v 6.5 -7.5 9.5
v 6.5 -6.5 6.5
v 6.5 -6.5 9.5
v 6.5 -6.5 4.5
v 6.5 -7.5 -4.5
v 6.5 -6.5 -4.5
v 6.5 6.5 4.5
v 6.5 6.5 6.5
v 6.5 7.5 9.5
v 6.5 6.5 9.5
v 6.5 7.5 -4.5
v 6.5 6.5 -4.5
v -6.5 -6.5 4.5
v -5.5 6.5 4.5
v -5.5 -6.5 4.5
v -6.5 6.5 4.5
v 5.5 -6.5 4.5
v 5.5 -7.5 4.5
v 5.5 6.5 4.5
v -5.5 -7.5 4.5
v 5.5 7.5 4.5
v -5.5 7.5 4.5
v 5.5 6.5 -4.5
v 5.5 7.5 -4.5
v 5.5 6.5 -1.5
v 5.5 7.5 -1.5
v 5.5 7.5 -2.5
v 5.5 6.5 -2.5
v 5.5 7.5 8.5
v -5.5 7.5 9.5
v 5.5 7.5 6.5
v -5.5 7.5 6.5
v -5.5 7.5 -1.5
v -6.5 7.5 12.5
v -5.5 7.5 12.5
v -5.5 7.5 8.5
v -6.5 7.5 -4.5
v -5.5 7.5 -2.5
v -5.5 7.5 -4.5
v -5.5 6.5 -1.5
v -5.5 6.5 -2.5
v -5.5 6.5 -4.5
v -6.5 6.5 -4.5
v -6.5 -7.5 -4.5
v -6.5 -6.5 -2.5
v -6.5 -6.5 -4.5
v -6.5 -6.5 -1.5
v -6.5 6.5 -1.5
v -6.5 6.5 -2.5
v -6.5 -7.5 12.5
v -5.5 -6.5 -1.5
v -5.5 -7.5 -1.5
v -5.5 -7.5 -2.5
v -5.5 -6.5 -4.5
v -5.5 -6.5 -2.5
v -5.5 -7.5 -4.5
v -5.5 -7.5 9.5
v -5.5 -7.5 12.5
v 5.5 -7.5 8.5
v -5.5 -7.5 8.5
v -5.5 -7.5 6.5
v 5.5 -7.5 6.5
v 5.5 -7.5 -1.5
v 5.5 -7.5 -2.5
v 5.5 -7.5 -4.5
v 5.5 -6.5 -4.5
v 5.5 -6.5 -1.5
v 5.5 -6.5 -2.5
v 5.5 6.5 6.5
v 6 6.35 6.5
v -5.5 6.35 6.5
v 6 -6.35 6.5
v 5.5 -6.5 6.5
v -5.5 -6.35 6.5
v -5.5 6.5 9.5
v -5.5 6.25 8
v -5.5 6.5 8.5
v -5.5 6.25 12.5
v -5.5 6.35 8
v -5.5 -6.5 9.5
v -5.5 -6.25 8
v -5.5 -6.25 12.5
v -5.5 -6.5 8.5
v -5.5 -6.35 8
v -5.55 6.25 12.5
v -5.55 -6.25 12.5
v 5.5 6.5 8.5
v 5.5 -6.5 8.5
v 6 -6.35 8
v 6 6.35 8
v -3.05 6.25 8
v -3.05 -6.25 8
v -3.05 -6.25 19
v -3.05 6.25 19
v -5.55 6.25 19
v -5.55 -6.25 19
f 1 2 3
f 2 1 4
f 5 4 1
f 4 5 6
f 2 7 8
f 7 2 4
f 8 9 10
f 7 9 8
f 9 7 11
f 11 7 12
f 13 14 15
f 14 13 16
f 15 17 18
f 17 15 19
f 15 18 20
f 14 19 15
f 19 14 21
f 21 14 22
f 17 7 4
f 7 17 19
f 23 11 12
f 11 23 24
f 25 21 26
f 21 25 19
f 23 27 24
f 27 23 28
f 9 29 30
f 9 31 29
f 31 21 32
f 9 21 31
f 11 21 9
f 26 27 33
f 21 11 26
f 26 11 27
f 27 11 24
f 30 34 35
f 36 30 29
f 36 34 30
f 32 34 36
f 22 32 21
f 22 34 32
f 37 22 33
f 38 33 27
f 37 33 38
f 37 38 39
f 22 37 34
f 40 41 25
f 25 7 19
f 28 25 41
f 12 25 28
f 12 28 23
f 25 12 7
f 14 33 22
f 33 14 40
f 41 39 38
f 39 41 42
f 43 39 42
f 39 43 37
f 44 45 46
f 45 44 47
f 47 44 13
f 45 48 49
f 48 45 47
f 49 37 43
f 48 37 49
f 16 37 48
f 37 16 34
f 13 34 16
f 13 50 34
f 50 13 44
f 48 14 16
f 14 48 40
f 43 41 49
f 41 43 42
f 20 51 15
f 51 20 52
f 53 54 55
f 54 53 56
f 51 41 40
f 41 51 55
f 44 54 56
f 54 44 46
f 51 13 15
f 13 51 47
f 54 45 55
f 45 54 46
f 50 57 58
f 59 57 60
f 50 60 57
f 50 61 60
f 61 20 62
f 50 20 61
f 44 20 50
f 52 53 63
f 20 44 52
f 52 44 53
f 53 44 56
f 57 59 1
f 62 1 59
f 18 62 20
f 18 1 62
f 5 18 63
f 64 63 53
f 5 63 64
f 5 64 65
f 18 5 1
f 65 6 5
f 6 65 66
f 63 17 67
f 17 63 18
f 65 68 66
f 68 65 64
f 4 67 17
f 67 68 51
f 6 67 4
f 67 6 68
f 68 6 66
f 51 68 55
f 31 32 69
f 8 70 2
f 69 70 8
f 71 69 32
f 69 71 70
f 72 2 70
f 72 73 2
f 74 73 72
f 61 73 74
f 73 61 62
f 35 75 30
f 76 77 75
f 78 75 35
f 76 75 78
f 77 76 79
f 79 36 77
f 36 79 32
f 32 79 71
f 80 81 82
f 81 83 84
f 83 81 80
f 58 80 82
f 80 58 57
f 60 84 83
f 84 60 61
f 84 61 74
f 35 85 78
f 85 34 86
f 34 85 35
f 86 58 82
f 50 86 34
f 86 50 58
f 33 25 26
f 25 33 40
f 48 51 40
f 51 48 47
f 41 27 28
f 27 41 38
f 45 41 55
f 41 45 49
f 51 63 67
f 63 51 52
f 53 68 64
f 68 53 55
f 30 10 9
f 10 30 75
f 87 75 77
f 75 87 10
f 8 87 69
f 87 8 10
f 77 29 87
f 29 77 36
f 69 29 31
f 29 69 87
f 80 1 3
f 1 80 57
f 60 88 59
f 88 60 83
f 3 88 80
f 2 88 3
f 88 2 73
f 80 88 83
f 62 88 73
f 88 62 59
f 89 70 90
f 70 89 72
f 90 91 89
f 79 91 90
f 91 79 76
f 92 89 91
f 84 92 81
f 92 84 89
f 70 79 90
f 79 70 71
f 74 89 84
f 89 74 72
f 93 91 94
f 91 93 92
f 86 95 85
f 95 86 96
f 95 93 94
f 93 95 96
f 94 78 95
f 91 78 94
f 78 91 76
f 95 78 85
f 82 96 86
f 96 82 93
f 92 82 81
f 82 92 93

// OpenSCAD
module Chair_02(){
    // INPUT DATA

    Table_Leg = [1,1,9];      // lenght, width and height of legs
    Table_Top_Height = 2;     //  Height of theSeat

    Leg_Distance_x = 12;        
    Leg_Distance_y = 14;     

    seat_height = 6;         // Backpost size 
    seat_width = 1;           // Backpost width (x axis)


    // OUTPUT DATA

    translate([Leg_Distance_x*0.5,Leg_Distance_y*0.5,0])
    color("#82490b")
    cube([Table_Leg[0],Table_Leg[1],Table_Leg[2]],center=true);

    translate([-Leg_Distance_x*0.5,Leg_Distance_y*0.5,0])
    color("#82490b")
    cube([Table_Leg[0],Table_Leg[1],Table_Leg[2]],center=true);

    translate([-Leg_Distance_x*0.5,-Leg_Distance_y*0.5,0])
    color("#82490b")
    cube([Table_Leg[0],Table_Leg[1],Table_Leg[2]],center=true);

    translate([Leg_Distance_x*0.5,-Leg_Distance_y*0.5,0])
    color("#82490b")
    cube([Table_Leg[0],Table_Leg[1],Table_Leg[2]],center=true);

    Table_Upper = [Leg_Distance_x + Table_Leg[0],Leg_Distance_y +Table_Leg[1],Table_Top_Height];

    seat = [seat_width,Leg_Distance_y+Table_Leg[1],seat_height];

    translate([0,0,Table_Leg[2]*0.5+Table_Top_Height*0.5])
    color("#82490b")
    cube([Table_Upper[0],Table_Upper[1],Table_Upper[2]],center=true);

    translate([-Table_Upper[0]*0.5+seat[0]*0.5,0,Table_Leg[2]*0.5+Table_Top_Height+seat_height*0.5])
    color("#82490b")
    cube([seat[0],seat[1],seat[2]],center=true);

    rotate([0,0,90])
    translate([7,0,-2])
    color("#82490b")
    cube([1,12,1],center=true);


    rotate([0,0,90])
    translate([-7,0,-2])
    color("#82490b")
    cube([1,12,1],center=true);


    rotate([0,0,0])
    translate([-6,0,-2])
    color("#82490b")
    cube([1,14,1],center=true);

    rotate([0,0,90])
    translate([7,0,9])
    color("#82490b")
    cube([1,12,1],center=true);

    rotate([90,0,0])
    translate([6,7.5,-7])
    color("#82490b")
    cube([1,4,1],center=true);

    rotate([0,0,90])
    translate([-7,0,9])
    color("#82490b")
    cube([1,12,1],center=true);

    rotate([90,0,0])
    translate([6,7.5,7])
    color("#82490b")
    cube([1,4,1],center=true);


    translate([0,0,7])
    color("#F4FFFF")
    cube([12,12.7,2],center=true);

    translate([-4.3,0,13])
    rotate([0,90,0])
    color("#F4FFFF")
    cube([12,12.5,2.5],center=true);

}

Chair_02();

// Written by Nicolì Angelo (Gengio) 2024: 
// MIT License

//Permission is hereby granted, free of charge, to any person obtaining a copy of this software and associated documentation files (the "Software"), to deal in the Software without restriction, including without limitation the rights to use, copy, modify, merge, publish, distribute, sublicense, and/or sell copies of the Software, and to permit persons to whom the Software is furnished to do so, subject to the following conditions:

//The above copyright notice and this permission notice shall be included in all copies or substantial portions of the Software.

//THE SOFTWARE IS PROVIDED "AS IS", WITHOUT WARRANTY OF ANY KIND, EXPRESS OR IMPLIED, INCLUDING BUT NOT LIMITED TO THE WARRANTIES OF MERCHANTABILITY, FITNESS FOR A PARTICULAR PURPOSE AND NONINFRINGEMENT. IN NO EVENT SHALL THE AUTHORS OR COPYRIGHT HOLDERS BE LIABLE FOR ANY CLAIM, DAMAGES OR OTHER LIABILITY, WHETHER IN AN ACTION OF CONTRACT, TORT OR OTHERWISE, ARISING FROM, OUT OF OR IN CONNECTION WITH THE SOFTWARE OR THE USE OR OTHER DEALINGS IN THE SOFTWARE.
